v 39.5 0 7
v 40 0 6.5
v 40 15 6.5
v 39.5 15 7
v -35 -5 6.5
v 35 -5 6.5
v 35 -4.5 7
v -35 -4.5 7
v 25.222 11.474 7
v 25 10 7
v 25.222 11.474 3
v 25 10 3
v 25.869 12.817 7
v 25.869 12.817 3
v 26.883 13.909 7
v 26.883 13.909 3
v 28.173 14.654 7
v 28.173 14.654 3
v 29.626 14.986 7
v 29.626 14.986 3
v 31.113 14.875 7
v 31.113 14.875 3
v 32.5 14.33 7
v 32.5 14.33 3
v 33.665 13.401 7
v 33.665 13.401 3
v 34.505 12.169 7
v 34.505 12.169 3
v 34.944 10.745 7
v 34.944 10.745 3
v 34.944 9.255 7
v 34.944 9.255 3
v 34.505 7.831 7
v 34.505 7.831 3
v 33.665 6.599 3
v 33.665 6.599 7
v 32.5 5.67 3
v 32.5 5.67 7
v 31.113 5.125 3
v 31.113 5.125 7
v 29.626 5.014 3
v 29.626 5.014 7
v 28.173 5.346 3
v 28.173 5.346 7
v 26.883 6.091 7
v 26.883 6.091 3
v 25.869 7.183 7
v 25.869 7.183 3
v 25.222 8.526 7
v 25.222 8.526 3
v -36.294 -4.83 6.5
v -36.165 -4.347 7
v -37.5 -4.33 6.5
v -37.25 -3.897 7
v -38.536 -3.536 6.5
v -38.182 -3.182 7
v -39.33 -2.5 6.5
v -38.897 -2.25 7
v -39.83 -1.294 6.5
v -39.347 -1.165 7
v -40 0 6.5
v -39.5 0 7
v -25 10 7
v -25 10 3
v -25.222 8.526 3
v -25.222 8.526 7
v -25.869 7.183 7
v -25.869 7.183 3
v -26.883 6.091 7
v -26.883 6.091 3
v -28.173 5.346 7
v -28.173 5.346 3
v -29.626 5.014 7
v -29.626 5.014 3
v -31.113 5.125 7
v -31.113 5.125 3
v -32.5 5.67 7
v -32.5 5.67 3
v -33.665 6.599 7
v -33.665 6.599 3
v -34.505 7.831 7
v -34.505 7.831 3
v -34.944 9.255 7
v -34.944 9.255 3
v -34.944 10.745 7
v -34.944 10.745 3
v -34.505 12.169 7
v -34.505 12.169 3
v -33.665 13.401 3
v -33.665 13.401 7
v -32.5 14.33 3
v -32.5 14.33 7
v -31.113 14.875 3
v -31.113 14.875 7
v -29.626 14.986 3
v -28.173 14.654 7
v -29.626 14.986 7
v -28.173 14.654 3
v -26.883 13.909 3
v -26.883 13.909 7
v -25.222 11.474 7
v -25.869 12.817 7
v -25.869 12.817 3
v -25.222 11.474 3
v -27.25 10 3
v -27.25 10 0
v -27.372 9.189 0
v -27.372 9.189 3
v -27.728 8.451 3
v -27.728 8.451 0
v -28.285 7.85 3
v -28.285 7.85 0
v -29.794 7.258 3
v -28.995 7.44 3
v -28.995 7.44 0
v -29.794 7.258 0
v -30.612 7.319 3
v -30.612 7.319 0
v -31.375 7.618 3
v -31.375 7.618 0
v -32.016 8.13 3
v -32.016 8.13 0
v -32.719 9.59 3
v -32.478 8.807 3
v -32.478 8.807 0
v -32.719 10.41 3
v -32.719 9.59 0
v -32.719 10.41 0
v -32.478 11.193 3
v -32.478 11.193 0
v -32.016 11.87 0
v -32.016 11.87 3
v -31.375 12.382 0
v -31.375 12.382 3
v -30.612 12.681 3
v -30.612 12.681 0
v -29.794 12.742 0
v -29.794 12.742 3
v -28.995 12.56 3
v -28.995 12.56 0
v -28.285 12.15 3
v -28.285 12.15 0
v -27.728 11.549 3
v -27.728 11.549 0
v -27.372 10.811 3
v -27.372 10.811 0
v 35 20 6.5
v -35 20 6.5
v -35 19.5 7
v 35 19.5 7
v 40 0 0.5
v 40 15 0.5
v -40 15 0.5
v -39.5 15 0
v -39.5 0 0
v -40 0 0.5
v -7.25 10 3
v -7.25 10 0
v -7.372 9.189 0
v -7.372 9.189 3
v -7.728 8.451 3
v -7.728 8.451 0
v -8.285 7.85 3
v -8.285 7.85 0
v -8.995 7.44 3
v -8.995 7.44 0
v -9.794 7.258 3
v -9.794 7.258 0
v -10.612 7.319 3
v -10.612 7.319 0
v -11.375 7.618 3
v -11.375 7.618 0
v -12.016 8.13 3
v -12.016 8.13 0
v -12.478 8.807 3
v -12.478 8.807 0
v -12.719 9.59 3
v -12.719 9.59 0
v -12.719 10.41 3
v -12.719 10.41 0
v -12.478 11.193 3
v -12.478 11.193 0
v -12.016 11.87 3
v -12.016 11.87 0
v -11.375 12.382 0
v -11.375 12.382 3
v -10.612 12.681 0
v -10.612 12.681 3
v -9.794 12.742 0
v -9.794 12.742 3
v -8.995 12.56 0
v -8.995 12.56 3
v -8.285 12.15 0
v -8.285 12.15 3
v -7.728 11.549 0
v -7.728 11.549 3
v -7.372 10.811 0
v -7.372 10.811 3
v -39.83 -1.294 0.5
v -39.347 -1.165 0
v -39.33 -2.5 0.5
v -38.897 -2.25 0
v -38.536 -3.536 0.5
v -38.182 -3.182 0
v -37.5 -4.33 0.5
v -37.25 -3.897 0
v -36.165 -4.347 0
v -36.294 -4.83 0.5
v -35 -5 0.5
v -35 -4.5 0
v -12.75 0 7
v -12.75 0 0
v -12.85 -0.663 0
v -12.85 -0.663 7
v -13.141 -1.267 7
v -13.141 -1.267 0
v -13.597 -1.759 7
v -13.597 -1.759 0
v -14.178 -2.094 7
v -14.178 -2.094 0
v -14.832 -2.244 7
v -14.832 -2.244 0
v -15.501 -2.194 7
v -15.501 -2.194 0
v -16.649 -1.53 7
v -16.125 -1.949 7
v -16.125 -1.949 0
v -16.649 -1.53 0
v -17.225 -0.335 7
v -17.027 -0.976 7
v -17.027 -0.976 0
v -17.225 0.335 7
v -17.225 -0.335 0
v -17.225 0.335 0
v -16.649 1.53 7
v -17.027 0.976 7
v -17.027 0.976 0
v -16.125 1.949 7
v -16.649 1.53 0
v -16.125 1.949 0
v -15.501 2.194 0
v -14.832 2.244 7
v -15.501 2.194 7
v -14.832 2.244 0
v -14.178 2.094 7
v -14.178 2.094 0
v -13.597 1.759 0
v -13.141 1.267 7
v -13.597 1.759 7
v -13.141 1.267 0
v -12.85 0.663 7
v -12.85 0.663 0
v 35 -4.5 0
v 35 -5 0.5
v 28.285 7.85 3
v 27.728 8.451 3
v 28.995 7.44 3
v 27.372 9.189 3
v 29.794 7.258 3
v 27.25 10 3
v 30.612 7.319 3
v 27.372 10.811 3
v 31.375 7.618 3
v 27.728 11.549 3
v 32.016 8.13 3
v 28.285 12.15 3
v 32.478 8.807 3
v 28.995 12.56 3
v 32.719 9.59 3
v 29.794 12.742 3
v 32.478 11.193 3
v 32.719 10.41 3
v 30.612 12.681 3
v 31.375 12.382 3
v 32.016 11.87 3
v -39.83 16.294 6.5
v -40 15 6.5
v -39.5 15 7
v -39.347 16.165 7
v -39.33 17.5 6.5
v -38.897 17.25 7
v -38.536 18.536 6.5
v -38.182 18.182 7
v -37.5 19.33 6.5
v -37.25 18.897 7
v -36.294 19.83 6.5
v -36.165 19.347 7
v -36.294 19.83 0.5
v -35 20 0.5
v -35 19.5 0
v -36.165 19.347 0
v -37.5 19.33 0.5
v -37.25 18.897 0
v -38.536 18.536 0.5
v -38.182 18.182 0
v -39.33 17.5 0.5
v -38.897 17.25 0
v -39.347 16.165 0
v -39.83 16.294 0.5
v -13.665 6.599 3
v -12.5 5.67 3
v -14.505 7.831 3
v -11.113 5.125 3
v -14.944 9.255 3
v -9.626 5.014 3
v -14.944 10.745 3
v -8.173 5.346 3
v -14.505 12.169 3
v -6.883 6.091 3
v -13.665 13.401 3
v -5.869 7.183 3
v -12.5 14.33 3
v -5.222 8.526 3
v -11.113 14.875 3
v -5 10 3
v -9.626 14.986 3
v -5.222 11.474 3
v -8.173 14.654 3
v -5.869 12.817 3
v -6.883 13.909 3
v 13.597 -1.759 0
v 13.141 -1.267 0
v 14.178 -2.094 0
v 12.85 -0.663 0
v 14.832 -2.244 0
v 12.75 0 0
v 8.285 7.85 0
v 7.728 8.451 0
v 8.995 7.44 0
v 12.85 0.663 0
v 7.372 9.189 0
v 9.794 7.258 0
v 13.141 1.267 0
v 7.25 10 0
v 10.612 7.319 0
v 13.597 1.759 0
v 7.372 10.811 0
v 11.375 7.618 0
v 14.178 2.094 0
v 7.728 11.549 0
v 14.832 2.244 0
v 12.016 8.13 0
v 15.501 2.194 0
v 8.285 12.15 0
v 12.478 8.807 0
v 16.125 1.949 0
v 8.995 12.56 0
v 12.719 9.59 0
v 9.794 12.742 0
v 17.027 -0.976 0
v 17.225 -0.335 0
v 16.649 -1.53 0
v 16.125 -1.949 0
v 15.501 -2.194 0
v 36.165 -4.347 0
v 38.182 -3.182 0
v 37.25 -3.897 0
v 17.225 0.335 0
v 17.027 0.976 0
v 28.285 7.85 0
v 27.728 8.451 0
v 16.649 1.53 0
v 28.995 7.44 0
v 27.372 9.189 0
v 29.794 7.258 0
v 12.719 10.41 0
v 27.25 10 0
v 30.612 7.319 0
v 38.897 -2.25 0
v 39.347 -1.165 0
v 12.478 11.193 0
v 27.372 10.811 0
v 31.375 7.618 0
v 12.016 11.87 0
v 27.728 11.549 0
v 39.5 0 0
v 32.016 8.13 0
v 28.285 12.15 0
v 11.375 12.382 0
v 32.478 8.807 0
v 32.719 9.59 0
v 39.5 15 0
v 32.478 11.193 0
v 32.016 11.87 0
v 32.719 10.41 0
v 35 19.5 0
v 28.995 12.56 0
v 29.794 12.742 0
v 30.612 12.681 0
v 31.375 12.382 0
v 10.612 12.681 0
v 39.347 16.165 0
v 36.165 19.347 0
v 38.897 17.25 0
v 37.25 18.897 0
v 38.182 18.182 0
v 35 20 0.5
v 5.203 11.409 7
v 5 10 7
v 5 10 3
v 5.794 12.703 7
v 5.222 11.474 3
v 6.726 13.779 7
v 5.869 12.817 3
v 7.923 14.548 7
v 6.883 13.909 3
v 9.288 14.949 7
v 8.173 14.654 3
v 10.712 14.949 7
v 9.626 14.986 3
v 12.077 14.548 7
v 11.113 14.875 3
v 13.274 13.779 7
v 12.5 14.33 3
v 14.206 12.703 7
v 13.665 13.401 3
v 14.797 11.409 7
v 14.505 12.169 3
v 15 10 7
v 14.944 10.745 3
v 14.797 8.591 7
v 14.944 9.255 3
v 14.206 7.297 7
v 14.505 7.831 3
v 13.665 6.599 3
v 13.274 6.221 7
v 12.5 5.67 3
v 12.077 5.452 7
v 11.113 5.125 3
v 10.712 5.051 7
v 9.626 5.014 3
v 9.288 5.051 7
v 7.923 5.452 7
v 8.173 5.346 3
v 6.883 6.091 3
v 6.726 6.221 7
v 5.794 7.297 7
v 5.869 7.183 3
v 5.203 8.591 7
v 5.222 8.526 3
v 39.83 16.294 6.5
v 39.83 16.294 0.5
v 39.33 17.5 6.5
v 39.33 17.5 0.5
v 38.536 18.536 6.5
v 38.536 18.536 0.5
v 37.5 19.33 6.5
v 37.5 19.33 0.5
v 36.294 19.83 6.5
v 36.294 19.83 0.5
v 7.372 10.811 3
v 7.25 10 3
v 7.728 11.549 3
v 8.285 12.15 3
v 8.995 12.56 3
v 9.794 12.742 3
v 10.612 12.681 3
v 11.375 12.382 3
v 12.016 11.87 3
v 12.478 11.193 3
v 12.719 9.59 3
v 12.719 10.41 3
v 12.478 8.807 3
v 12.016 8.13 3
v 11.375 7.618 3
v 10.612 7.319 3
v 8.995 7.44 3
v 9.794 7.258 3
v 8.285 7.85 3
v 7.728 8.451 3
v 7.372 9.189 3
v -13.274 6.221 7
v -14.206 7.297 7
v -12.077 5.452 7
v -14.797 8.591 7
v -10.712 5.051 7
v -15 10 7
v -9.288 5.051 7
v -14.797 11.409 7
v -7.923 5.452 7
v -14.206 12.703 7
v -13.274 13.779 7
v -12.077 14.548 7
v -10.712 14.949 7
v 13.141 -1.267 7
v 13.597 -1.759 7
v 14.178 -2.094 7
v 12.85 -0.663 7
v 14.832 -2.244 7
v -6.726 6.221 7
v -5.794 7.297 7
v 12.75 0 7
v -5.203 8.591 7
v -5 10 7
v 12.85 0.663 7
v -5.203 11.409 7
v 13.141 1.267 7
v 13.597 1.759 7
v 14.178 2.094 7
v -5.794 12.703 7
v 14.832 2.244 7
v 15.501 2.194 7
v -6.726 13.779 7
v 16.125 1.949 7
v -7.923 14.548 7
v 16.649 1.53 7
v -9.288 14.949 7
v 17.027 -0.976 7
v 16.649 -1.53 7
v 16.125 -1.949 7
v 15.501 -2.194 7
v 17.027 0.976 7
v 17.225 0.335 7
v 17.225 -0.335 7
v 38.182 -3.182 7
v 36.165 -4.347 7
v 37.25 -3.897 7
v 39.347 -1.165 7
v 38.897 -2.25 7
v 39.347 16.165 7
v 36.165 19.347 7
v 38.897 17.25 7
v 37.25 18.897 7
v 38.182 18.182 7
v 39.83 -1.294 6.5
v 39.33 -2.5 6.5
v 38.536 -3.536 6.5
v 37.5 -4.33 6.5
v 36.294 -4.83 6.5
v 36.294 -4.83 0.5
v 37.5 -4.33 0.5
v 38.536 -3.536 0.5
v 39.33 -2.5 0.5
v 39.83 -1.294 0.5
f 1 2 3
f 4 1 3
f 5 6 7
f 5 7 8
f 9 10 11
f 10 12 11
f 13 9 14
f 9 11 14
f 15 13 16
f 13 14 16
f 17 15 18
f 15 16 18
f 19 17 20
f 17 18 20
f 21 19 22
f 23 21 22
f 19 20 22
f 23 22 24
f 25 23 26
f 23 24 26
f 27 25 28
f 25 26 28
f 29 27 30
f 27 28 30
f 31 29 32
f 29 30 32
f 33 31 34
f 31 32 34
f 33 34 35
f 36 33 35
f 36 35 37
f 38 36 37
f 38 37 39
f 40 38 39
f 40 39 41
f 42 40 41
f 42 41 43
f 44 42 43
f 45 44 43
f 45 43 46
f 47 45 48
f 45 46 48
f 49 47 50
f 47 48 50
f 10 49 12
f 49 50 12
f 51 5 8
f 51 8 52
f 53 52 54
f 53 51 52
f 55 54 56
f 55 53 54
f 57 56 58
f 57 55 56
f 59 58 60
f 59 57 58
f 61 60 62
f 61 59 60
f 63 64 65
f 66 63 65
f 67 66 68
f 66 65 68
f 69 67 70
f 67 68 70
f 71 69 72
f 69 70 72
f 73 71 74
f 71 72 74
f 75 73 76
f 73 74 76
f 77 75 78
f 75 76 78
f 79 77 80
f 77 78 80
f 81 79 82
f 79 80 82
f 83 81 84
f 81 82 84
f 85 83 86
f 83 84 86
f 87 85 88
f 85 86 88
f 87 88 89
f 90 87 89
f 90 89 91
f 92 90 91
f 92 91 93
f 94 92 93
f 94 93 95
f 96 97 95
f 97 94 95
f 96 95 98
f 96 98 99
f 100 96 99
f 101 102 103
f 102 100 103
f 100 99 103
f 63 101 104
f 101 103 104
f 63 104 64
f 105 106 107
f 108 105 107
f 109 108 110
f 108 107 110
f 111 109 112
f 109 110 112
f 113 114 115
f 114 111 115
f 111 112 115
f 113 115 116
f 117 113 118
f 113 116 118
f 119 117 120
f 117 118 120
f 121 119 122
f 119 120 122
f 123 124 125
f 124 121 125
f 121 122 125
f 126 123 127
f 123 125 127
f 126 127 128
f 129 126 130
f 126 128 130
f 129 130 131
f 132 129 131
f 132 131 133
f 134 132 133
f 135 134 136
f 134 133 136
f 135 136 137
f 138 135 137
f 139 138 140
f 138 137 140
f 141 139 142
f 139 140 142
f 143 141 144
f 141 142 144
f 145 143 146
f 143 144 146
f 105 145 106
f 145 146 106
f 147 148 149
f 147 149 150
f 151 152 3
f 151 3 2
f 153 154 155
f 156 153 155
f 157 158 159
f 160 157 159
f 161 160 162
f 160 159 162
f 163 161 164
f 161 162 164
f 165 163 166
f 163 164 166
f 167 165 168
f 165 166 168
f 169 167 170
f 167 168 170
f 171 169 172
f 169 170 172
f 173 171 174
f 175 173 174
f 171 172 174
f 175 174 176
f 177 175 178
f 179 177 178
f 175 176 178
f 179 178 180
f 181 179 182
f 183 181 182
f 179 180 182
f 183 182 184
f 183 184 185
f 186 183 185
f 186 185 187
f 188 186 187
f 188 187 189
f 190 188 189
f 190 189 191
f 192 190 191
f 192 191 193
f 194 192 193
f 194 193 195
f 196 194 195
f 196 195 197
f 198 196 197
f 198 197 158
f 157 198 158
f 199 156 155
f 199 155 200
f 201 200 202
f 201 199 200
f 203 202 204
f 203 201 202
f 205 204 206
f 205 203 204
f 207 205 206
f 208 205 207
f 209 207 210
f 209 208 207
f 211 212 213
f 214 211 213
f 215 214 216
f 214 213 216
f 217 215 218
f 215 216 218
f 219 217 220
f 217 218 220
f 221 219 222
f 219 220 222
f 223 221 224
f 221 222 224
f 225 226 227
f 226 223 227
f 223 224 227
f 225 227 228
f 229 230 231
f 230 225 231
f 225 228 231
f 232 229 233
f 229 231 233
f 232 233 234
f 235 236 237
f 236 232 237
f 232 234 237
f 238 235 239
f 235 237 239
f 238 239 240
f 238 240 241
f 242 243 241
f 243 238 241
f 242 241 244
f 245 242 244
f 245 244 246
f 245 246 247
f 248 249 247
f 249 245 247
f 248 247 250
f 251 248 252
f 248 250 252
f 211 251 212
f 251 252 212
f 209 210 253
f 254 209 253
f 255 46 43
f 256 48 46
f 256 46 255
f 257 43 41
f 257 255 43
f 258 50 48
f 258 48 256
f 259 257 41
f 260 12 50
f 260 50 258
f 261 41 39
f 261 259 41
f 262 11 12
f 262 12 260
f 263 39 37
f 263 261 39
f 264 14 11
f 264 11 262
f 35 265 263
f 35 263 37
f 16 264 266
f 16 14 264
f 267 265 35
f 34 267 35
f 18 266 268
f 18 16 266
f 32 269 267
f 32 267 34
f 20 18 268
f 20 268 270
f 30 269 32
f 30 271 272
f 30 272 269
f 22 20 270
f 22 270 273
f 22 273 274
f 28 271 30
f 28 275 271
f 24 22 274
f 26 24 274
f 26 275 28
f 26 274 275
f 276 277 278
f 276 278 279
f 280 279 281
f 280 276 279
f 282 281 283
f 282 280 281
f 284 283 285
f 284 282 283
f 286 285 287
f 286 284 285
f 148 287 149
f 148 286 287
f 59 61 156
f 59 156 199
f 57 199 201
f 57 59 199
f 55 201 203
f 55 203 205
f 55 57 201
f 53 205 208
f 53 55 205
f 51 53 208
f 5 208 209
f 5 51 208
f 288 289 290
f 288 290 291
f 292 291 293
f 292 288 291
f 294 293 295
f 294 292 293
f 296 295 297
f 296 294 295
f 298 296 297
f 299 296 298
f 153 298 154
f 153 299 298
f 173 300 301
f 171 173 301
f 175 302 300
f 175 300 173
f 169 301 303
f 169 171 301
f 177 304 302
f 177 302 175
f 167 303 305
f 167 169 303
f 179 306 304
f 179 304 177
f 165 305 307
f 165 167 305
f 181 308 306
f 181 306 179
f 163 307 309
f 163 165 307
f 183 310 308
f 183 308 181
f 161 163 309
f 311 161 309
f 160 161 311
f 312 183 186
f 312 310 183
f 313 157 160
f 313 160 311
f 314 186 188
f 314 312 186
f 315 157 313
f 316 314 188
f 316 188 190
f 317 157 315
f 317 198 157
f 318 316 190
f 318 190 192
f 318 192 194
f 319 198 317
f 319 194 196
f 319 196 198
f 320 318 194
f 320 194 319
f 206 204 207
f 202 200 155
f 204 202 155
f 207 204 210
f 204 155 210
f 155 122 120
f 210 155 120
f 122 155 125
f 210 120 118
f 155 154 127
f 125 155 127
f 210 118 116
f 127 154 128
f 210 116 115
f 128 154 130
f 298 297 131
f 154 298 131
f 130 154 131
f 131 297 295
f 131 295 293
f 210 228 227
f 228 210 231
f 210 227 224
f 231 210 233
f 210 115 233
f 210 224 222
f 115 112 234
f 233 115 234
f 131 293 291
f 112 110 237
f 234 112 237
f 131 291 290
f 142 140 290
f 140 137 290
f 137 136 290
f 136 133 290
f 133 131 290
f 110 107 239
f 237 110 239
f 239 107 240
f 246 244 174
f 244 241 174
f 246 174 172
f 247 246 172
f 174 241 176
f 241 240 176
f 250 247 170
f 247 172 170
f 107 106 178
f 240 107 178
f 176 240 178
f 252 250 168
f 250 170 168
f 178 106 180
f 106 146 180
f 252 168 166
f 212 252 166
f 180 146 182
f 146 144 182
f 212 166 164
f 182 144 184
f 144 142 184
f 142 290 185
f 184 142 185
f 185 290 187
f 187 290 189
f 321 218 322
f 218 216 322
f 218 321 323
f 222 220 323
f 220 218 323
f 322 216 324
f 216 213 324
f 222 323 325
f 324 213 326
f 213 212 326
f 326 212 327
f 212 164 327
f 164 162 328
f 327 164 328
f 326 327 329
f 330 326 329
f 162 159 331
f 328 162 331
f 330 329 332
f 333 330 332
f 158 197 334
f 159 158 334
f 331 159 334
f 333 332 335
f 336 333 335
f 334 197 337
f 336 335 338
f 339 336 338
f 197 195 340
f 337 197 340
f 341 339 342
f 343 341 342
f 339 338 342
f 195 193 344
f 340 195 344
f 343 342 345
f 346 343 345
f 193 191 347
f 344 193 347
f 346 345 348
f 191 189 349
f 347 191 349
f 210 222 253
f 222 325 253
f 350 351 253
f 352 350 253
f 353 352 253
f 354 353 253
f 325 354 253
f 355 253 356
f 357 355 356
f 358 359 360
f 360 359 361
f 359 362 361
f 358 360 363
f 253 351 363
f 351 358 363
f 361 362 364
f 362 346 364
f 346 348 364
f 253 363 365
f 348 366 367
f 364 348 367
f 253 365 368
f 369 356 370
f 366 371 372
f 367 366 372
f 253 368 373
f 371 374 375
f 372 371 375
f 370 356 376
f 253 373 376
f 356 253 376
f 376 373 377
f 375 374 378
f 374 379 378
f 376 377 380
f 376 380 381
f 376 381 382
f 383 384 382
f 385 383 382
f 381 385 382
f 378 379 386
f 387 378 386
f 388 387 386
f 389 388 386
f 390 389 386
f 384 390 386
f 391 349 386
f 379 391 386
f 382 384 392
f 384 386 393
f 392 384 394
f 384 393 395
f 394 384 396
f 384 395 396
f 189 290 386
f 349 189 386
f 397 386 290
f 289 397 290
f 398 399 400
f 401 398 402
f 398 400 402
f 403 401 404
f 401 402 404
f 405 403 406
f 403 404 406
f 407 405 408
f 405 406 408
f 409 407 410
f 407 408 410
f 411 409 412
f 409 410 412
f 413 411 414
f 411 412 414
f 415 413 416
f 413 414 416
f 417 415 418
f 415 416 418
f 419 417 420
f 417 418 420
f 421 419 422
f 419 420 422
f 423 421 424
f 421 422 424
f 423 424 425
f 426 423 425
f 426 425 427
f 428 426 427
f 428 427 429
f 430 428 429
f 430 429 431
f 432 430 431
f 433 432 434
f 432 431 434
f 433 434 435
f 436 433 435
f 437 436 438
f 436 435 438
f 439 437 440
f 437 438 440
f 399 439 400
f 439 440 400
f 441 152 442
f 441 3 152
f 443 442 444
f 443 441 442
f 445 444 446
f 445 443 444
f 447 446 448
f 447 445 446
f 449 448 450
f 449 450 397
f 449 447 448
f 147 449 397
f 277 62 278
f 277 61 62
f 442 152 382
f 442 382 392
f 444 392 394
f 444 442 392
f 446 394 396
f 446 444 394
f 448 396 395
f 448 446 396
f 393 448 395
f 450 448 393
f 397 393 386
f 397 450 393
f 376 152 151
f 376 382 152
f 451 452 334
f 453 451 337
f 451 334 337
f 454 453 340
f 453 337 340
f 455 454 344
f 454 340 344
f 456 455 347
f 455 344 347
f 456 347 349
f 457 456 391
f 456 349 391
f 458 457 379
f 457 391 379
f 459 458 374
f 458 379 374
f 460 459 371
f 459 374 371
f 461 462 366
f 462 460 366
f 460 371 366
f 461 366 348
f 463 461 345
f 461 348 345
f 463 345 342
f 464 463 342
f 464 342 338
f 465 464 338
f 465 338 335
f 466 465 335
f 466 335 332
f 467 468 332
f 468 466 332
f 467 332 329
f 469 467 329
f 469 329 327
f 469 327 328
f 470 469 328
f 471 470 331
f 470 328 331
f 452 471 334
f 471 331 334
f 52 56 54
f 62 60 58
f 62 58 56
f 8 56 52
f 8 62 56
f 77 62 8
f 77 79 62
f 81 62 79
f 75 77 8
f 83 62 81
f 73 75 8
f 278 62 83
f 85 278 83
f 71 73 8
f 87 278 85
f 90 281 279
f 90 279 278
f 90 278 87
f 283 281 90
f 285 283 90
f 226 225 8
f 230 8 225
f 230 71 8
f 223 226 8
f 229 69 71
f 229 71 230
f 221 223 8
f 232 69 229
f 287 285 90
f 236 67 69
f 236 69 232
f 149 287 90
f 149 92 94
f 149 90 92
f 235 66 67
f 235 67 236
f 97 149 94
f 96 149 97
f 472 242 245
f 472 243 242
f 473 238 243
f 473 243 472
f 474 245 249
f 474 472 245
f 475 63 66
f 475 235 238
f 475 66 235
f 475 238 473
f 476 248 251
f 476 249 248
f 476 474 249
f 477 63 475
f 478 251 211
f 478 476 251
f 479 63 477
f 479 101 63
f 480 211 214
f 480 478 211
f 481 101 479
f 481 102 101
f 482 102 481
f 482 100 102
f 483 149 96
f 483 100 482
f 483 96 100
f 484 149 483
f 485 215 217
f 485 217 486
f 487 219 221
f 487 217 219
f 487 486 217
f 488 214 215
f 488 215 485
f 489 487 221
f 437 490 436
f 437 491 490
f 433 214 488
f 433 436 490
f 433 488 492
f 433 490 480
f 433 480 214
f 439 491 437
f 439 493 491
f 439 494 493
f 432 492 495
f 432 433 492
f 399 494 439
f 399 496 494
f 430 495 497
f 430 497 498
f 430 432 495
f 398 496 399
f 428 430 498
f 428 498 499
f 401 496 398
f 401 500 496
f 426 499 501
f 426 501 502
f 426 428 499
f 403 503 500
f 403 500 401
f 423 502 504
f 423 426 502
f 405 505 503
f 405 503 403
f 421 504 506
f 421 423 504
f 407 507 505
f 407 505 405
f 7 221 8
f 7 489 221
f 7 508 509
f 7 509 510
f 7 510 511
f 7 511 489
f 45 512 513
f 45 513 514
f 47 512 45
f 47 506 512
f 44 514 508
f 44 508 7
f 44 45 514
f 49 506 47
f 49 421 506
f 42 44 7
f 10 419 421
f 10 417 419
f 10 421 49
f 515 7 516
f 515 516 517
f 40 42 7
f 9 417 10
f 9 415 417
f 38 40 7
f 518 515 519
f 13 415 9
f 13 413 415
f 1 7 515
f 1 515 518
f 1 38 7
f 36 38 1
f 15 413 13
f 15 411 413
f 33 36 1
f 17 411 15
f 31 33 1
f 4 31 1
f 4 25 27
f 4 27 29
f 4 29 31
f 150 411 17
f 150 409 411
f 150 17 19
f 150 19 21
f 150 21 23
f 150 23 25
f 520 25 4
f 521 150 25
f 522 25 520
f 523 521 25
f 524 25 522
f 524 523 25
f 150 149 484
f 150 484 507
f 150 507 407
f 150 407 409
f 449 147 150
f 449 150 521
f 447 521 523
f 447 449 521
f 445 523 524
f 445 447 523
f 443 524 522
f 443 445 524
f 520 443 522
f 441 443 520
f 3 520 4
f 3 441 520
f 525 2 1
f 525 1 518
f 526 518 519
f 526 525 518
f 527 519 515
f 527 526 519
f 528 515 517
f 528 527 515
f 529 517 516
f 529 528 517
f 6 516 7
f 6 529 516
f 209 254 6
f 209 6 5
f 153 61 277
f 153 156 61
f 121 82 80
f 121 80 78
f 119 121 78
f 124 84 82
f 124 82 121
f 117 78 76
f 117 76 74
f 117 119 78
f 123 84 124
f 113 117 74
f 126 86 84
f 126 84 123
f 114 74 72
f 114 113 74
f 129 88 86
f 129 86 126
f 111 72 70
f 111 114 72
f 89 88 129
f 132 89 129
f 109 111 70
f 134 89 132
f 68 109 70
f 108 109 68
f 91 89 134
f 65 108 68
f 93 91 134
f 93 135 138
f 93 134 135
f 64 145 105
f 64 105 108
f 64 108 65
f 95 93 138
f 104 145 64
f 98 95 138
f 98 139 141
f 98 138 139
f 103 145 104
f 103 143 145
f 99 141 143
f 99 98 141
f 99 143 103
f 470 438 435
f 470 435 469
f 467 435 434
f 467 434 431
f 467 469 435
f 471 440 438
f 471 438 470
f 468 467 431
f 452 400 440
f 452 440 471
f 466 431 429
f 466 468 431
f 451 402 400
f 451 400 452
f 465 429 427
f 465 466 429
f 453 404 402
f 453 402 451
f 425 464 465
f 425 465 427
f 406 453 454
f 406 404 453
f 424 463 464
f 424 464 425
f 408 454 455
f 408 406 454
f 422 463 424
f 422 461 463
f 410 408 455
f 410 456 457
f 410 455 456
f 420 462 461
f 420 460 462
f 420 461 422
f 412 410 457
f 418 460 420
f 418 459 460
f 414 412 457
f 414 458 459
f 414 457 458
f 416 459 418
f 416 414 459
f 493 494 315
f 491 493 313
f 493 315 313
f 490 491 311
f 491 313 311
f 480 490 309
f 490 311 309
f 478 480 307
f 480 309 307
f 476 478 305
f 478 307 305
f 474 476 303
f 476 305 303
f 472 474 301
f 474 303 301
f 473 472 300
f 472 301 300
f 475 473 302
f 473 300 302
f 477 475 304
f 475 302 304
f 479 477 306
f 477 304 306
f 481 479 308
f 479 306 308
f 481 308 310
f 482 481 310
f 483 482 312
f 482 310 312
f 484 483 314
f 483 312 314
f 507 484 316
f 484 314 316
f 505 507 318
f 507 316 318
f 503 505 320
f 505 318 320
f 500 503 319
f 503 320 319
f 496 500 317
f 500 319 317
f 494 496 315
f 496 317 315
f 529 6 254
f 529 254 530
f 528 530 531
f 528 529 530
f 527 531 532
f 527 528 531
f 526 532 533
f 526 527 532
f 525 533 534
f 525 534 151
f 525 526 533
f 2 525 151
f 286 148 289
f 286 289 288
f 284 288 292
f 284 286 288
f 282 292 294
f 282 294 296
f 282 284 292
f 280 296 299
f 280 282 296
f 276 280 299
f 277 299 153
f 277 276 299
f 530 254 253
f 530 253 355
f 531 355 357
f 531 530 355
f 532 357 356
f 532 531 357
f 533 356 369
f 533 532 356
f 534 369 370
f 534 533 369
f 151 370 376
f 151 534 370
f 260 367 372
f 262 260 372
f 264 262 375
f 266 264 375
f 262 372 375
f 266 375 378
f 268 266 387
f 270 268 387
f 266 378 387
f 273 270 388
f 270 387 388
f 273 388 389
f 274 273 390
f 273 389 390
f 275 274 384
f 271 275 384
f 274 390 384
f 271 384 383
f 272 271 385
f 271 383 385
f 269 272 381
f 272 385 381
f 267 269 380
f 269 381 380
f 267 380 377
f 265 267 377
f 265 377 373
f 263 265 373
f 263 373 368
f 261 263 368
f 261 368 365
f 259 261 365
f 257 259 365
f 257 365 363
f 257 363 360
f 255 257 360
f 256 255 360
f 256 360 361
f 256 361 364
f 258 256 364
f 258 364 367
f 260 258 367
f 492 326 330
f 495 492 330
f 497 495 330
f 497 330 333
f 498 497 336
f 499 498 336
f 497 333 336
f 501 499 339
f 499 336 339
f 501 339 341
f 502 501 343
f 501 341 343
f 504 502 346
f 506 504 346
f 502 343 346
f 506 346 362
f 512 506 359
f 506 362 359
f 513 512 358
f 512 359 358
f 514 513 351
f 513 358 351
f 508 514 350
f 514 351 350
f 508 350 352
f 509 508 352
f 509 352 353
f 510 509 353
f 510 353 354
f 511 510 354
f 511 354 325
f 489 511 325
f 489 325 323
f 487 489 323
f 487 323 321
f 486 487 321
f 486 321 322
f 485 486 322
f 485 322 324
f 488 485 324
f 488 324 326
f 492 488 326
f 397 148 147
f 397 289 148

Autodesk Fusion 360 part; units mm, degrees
sketch "Skizze1" plane through (0, 0, 0) normal (0, 0, 1) x (1, 0, 0)
  circle A0 centre (-15, 0) radius 2.25
  circle A1 centre (-30, 10) radius 2.75
  line L0 (-40, 20) -> (0, 20)
  line L1 (0, 20) -> (0, -5)
  line L2 (0, -5) -> (-40, -5)
  line L3 (-40, -5) -> (-40, 20)
  circle A2 centre (-10, 10) radius 2.75
  line L4 (-30, 10) -> (0, 10)
  circle A3 centre (-10, 10) radius 5
  circle A4 centre (-30, 10) radius 5
  line L5 (-15, 0) -> (0, 0)
  dimension "d1" = 4.5
  dimension "d2" = 15
  dimension "d4" = 5.5
  dimension "d5" = 40
  dimension "d16" = 30
  dimension "d17" = 20
  dimension "d18" = 10
  dimension "d19" = 10
  dimension "d20" = 10
  dimension "d21" = 5
extrude "Extrusion1" add sketch "Skizze1" along normal blind 7 contours L0 L1 L2 L3
extrude "Extrusion2" add sketch "Skizze1" along normal blind 3 contours A4 | A2 L4 A3 | A2 L4 A3
fillet "Abrundung1" radius 5 2 edges at (-40, 20, 3.5) (-40, -5, 3.5)
mirror "Spiegeln1" about plane through (0, 20, 0) normal (1, 0, 0) of bodies 1 merged
chamfer "Fase1" distance 0.5 angle 45 16 edges at (0, 20, 7) (38.5355, 18.5355, 7) (40, 7.5, 7) (38.5355, -3.5355, 7) (0, -5, 7) (-38.5355, -3.5355, 7) (-40, 7.5, 7) (-38.5355, 18.5355, 7) (0, -5, 0) (-38.5355, -3.5355, 0) (-40, 7.5, 0) (-38.5355, 18.5355, 0) (0, 20, 0) (38.5355, 18.5355, 0) (40, 7.5, 0) (38.5355, -3.5355, 0)
equation "d2 = ( 30 / 2 ) * 1 mm"
equation "d5 = ( 80 / 2 ) * 1 mm"
equation "d16 = ( 80 / 2 ) * 1 mm - 10 mm"
